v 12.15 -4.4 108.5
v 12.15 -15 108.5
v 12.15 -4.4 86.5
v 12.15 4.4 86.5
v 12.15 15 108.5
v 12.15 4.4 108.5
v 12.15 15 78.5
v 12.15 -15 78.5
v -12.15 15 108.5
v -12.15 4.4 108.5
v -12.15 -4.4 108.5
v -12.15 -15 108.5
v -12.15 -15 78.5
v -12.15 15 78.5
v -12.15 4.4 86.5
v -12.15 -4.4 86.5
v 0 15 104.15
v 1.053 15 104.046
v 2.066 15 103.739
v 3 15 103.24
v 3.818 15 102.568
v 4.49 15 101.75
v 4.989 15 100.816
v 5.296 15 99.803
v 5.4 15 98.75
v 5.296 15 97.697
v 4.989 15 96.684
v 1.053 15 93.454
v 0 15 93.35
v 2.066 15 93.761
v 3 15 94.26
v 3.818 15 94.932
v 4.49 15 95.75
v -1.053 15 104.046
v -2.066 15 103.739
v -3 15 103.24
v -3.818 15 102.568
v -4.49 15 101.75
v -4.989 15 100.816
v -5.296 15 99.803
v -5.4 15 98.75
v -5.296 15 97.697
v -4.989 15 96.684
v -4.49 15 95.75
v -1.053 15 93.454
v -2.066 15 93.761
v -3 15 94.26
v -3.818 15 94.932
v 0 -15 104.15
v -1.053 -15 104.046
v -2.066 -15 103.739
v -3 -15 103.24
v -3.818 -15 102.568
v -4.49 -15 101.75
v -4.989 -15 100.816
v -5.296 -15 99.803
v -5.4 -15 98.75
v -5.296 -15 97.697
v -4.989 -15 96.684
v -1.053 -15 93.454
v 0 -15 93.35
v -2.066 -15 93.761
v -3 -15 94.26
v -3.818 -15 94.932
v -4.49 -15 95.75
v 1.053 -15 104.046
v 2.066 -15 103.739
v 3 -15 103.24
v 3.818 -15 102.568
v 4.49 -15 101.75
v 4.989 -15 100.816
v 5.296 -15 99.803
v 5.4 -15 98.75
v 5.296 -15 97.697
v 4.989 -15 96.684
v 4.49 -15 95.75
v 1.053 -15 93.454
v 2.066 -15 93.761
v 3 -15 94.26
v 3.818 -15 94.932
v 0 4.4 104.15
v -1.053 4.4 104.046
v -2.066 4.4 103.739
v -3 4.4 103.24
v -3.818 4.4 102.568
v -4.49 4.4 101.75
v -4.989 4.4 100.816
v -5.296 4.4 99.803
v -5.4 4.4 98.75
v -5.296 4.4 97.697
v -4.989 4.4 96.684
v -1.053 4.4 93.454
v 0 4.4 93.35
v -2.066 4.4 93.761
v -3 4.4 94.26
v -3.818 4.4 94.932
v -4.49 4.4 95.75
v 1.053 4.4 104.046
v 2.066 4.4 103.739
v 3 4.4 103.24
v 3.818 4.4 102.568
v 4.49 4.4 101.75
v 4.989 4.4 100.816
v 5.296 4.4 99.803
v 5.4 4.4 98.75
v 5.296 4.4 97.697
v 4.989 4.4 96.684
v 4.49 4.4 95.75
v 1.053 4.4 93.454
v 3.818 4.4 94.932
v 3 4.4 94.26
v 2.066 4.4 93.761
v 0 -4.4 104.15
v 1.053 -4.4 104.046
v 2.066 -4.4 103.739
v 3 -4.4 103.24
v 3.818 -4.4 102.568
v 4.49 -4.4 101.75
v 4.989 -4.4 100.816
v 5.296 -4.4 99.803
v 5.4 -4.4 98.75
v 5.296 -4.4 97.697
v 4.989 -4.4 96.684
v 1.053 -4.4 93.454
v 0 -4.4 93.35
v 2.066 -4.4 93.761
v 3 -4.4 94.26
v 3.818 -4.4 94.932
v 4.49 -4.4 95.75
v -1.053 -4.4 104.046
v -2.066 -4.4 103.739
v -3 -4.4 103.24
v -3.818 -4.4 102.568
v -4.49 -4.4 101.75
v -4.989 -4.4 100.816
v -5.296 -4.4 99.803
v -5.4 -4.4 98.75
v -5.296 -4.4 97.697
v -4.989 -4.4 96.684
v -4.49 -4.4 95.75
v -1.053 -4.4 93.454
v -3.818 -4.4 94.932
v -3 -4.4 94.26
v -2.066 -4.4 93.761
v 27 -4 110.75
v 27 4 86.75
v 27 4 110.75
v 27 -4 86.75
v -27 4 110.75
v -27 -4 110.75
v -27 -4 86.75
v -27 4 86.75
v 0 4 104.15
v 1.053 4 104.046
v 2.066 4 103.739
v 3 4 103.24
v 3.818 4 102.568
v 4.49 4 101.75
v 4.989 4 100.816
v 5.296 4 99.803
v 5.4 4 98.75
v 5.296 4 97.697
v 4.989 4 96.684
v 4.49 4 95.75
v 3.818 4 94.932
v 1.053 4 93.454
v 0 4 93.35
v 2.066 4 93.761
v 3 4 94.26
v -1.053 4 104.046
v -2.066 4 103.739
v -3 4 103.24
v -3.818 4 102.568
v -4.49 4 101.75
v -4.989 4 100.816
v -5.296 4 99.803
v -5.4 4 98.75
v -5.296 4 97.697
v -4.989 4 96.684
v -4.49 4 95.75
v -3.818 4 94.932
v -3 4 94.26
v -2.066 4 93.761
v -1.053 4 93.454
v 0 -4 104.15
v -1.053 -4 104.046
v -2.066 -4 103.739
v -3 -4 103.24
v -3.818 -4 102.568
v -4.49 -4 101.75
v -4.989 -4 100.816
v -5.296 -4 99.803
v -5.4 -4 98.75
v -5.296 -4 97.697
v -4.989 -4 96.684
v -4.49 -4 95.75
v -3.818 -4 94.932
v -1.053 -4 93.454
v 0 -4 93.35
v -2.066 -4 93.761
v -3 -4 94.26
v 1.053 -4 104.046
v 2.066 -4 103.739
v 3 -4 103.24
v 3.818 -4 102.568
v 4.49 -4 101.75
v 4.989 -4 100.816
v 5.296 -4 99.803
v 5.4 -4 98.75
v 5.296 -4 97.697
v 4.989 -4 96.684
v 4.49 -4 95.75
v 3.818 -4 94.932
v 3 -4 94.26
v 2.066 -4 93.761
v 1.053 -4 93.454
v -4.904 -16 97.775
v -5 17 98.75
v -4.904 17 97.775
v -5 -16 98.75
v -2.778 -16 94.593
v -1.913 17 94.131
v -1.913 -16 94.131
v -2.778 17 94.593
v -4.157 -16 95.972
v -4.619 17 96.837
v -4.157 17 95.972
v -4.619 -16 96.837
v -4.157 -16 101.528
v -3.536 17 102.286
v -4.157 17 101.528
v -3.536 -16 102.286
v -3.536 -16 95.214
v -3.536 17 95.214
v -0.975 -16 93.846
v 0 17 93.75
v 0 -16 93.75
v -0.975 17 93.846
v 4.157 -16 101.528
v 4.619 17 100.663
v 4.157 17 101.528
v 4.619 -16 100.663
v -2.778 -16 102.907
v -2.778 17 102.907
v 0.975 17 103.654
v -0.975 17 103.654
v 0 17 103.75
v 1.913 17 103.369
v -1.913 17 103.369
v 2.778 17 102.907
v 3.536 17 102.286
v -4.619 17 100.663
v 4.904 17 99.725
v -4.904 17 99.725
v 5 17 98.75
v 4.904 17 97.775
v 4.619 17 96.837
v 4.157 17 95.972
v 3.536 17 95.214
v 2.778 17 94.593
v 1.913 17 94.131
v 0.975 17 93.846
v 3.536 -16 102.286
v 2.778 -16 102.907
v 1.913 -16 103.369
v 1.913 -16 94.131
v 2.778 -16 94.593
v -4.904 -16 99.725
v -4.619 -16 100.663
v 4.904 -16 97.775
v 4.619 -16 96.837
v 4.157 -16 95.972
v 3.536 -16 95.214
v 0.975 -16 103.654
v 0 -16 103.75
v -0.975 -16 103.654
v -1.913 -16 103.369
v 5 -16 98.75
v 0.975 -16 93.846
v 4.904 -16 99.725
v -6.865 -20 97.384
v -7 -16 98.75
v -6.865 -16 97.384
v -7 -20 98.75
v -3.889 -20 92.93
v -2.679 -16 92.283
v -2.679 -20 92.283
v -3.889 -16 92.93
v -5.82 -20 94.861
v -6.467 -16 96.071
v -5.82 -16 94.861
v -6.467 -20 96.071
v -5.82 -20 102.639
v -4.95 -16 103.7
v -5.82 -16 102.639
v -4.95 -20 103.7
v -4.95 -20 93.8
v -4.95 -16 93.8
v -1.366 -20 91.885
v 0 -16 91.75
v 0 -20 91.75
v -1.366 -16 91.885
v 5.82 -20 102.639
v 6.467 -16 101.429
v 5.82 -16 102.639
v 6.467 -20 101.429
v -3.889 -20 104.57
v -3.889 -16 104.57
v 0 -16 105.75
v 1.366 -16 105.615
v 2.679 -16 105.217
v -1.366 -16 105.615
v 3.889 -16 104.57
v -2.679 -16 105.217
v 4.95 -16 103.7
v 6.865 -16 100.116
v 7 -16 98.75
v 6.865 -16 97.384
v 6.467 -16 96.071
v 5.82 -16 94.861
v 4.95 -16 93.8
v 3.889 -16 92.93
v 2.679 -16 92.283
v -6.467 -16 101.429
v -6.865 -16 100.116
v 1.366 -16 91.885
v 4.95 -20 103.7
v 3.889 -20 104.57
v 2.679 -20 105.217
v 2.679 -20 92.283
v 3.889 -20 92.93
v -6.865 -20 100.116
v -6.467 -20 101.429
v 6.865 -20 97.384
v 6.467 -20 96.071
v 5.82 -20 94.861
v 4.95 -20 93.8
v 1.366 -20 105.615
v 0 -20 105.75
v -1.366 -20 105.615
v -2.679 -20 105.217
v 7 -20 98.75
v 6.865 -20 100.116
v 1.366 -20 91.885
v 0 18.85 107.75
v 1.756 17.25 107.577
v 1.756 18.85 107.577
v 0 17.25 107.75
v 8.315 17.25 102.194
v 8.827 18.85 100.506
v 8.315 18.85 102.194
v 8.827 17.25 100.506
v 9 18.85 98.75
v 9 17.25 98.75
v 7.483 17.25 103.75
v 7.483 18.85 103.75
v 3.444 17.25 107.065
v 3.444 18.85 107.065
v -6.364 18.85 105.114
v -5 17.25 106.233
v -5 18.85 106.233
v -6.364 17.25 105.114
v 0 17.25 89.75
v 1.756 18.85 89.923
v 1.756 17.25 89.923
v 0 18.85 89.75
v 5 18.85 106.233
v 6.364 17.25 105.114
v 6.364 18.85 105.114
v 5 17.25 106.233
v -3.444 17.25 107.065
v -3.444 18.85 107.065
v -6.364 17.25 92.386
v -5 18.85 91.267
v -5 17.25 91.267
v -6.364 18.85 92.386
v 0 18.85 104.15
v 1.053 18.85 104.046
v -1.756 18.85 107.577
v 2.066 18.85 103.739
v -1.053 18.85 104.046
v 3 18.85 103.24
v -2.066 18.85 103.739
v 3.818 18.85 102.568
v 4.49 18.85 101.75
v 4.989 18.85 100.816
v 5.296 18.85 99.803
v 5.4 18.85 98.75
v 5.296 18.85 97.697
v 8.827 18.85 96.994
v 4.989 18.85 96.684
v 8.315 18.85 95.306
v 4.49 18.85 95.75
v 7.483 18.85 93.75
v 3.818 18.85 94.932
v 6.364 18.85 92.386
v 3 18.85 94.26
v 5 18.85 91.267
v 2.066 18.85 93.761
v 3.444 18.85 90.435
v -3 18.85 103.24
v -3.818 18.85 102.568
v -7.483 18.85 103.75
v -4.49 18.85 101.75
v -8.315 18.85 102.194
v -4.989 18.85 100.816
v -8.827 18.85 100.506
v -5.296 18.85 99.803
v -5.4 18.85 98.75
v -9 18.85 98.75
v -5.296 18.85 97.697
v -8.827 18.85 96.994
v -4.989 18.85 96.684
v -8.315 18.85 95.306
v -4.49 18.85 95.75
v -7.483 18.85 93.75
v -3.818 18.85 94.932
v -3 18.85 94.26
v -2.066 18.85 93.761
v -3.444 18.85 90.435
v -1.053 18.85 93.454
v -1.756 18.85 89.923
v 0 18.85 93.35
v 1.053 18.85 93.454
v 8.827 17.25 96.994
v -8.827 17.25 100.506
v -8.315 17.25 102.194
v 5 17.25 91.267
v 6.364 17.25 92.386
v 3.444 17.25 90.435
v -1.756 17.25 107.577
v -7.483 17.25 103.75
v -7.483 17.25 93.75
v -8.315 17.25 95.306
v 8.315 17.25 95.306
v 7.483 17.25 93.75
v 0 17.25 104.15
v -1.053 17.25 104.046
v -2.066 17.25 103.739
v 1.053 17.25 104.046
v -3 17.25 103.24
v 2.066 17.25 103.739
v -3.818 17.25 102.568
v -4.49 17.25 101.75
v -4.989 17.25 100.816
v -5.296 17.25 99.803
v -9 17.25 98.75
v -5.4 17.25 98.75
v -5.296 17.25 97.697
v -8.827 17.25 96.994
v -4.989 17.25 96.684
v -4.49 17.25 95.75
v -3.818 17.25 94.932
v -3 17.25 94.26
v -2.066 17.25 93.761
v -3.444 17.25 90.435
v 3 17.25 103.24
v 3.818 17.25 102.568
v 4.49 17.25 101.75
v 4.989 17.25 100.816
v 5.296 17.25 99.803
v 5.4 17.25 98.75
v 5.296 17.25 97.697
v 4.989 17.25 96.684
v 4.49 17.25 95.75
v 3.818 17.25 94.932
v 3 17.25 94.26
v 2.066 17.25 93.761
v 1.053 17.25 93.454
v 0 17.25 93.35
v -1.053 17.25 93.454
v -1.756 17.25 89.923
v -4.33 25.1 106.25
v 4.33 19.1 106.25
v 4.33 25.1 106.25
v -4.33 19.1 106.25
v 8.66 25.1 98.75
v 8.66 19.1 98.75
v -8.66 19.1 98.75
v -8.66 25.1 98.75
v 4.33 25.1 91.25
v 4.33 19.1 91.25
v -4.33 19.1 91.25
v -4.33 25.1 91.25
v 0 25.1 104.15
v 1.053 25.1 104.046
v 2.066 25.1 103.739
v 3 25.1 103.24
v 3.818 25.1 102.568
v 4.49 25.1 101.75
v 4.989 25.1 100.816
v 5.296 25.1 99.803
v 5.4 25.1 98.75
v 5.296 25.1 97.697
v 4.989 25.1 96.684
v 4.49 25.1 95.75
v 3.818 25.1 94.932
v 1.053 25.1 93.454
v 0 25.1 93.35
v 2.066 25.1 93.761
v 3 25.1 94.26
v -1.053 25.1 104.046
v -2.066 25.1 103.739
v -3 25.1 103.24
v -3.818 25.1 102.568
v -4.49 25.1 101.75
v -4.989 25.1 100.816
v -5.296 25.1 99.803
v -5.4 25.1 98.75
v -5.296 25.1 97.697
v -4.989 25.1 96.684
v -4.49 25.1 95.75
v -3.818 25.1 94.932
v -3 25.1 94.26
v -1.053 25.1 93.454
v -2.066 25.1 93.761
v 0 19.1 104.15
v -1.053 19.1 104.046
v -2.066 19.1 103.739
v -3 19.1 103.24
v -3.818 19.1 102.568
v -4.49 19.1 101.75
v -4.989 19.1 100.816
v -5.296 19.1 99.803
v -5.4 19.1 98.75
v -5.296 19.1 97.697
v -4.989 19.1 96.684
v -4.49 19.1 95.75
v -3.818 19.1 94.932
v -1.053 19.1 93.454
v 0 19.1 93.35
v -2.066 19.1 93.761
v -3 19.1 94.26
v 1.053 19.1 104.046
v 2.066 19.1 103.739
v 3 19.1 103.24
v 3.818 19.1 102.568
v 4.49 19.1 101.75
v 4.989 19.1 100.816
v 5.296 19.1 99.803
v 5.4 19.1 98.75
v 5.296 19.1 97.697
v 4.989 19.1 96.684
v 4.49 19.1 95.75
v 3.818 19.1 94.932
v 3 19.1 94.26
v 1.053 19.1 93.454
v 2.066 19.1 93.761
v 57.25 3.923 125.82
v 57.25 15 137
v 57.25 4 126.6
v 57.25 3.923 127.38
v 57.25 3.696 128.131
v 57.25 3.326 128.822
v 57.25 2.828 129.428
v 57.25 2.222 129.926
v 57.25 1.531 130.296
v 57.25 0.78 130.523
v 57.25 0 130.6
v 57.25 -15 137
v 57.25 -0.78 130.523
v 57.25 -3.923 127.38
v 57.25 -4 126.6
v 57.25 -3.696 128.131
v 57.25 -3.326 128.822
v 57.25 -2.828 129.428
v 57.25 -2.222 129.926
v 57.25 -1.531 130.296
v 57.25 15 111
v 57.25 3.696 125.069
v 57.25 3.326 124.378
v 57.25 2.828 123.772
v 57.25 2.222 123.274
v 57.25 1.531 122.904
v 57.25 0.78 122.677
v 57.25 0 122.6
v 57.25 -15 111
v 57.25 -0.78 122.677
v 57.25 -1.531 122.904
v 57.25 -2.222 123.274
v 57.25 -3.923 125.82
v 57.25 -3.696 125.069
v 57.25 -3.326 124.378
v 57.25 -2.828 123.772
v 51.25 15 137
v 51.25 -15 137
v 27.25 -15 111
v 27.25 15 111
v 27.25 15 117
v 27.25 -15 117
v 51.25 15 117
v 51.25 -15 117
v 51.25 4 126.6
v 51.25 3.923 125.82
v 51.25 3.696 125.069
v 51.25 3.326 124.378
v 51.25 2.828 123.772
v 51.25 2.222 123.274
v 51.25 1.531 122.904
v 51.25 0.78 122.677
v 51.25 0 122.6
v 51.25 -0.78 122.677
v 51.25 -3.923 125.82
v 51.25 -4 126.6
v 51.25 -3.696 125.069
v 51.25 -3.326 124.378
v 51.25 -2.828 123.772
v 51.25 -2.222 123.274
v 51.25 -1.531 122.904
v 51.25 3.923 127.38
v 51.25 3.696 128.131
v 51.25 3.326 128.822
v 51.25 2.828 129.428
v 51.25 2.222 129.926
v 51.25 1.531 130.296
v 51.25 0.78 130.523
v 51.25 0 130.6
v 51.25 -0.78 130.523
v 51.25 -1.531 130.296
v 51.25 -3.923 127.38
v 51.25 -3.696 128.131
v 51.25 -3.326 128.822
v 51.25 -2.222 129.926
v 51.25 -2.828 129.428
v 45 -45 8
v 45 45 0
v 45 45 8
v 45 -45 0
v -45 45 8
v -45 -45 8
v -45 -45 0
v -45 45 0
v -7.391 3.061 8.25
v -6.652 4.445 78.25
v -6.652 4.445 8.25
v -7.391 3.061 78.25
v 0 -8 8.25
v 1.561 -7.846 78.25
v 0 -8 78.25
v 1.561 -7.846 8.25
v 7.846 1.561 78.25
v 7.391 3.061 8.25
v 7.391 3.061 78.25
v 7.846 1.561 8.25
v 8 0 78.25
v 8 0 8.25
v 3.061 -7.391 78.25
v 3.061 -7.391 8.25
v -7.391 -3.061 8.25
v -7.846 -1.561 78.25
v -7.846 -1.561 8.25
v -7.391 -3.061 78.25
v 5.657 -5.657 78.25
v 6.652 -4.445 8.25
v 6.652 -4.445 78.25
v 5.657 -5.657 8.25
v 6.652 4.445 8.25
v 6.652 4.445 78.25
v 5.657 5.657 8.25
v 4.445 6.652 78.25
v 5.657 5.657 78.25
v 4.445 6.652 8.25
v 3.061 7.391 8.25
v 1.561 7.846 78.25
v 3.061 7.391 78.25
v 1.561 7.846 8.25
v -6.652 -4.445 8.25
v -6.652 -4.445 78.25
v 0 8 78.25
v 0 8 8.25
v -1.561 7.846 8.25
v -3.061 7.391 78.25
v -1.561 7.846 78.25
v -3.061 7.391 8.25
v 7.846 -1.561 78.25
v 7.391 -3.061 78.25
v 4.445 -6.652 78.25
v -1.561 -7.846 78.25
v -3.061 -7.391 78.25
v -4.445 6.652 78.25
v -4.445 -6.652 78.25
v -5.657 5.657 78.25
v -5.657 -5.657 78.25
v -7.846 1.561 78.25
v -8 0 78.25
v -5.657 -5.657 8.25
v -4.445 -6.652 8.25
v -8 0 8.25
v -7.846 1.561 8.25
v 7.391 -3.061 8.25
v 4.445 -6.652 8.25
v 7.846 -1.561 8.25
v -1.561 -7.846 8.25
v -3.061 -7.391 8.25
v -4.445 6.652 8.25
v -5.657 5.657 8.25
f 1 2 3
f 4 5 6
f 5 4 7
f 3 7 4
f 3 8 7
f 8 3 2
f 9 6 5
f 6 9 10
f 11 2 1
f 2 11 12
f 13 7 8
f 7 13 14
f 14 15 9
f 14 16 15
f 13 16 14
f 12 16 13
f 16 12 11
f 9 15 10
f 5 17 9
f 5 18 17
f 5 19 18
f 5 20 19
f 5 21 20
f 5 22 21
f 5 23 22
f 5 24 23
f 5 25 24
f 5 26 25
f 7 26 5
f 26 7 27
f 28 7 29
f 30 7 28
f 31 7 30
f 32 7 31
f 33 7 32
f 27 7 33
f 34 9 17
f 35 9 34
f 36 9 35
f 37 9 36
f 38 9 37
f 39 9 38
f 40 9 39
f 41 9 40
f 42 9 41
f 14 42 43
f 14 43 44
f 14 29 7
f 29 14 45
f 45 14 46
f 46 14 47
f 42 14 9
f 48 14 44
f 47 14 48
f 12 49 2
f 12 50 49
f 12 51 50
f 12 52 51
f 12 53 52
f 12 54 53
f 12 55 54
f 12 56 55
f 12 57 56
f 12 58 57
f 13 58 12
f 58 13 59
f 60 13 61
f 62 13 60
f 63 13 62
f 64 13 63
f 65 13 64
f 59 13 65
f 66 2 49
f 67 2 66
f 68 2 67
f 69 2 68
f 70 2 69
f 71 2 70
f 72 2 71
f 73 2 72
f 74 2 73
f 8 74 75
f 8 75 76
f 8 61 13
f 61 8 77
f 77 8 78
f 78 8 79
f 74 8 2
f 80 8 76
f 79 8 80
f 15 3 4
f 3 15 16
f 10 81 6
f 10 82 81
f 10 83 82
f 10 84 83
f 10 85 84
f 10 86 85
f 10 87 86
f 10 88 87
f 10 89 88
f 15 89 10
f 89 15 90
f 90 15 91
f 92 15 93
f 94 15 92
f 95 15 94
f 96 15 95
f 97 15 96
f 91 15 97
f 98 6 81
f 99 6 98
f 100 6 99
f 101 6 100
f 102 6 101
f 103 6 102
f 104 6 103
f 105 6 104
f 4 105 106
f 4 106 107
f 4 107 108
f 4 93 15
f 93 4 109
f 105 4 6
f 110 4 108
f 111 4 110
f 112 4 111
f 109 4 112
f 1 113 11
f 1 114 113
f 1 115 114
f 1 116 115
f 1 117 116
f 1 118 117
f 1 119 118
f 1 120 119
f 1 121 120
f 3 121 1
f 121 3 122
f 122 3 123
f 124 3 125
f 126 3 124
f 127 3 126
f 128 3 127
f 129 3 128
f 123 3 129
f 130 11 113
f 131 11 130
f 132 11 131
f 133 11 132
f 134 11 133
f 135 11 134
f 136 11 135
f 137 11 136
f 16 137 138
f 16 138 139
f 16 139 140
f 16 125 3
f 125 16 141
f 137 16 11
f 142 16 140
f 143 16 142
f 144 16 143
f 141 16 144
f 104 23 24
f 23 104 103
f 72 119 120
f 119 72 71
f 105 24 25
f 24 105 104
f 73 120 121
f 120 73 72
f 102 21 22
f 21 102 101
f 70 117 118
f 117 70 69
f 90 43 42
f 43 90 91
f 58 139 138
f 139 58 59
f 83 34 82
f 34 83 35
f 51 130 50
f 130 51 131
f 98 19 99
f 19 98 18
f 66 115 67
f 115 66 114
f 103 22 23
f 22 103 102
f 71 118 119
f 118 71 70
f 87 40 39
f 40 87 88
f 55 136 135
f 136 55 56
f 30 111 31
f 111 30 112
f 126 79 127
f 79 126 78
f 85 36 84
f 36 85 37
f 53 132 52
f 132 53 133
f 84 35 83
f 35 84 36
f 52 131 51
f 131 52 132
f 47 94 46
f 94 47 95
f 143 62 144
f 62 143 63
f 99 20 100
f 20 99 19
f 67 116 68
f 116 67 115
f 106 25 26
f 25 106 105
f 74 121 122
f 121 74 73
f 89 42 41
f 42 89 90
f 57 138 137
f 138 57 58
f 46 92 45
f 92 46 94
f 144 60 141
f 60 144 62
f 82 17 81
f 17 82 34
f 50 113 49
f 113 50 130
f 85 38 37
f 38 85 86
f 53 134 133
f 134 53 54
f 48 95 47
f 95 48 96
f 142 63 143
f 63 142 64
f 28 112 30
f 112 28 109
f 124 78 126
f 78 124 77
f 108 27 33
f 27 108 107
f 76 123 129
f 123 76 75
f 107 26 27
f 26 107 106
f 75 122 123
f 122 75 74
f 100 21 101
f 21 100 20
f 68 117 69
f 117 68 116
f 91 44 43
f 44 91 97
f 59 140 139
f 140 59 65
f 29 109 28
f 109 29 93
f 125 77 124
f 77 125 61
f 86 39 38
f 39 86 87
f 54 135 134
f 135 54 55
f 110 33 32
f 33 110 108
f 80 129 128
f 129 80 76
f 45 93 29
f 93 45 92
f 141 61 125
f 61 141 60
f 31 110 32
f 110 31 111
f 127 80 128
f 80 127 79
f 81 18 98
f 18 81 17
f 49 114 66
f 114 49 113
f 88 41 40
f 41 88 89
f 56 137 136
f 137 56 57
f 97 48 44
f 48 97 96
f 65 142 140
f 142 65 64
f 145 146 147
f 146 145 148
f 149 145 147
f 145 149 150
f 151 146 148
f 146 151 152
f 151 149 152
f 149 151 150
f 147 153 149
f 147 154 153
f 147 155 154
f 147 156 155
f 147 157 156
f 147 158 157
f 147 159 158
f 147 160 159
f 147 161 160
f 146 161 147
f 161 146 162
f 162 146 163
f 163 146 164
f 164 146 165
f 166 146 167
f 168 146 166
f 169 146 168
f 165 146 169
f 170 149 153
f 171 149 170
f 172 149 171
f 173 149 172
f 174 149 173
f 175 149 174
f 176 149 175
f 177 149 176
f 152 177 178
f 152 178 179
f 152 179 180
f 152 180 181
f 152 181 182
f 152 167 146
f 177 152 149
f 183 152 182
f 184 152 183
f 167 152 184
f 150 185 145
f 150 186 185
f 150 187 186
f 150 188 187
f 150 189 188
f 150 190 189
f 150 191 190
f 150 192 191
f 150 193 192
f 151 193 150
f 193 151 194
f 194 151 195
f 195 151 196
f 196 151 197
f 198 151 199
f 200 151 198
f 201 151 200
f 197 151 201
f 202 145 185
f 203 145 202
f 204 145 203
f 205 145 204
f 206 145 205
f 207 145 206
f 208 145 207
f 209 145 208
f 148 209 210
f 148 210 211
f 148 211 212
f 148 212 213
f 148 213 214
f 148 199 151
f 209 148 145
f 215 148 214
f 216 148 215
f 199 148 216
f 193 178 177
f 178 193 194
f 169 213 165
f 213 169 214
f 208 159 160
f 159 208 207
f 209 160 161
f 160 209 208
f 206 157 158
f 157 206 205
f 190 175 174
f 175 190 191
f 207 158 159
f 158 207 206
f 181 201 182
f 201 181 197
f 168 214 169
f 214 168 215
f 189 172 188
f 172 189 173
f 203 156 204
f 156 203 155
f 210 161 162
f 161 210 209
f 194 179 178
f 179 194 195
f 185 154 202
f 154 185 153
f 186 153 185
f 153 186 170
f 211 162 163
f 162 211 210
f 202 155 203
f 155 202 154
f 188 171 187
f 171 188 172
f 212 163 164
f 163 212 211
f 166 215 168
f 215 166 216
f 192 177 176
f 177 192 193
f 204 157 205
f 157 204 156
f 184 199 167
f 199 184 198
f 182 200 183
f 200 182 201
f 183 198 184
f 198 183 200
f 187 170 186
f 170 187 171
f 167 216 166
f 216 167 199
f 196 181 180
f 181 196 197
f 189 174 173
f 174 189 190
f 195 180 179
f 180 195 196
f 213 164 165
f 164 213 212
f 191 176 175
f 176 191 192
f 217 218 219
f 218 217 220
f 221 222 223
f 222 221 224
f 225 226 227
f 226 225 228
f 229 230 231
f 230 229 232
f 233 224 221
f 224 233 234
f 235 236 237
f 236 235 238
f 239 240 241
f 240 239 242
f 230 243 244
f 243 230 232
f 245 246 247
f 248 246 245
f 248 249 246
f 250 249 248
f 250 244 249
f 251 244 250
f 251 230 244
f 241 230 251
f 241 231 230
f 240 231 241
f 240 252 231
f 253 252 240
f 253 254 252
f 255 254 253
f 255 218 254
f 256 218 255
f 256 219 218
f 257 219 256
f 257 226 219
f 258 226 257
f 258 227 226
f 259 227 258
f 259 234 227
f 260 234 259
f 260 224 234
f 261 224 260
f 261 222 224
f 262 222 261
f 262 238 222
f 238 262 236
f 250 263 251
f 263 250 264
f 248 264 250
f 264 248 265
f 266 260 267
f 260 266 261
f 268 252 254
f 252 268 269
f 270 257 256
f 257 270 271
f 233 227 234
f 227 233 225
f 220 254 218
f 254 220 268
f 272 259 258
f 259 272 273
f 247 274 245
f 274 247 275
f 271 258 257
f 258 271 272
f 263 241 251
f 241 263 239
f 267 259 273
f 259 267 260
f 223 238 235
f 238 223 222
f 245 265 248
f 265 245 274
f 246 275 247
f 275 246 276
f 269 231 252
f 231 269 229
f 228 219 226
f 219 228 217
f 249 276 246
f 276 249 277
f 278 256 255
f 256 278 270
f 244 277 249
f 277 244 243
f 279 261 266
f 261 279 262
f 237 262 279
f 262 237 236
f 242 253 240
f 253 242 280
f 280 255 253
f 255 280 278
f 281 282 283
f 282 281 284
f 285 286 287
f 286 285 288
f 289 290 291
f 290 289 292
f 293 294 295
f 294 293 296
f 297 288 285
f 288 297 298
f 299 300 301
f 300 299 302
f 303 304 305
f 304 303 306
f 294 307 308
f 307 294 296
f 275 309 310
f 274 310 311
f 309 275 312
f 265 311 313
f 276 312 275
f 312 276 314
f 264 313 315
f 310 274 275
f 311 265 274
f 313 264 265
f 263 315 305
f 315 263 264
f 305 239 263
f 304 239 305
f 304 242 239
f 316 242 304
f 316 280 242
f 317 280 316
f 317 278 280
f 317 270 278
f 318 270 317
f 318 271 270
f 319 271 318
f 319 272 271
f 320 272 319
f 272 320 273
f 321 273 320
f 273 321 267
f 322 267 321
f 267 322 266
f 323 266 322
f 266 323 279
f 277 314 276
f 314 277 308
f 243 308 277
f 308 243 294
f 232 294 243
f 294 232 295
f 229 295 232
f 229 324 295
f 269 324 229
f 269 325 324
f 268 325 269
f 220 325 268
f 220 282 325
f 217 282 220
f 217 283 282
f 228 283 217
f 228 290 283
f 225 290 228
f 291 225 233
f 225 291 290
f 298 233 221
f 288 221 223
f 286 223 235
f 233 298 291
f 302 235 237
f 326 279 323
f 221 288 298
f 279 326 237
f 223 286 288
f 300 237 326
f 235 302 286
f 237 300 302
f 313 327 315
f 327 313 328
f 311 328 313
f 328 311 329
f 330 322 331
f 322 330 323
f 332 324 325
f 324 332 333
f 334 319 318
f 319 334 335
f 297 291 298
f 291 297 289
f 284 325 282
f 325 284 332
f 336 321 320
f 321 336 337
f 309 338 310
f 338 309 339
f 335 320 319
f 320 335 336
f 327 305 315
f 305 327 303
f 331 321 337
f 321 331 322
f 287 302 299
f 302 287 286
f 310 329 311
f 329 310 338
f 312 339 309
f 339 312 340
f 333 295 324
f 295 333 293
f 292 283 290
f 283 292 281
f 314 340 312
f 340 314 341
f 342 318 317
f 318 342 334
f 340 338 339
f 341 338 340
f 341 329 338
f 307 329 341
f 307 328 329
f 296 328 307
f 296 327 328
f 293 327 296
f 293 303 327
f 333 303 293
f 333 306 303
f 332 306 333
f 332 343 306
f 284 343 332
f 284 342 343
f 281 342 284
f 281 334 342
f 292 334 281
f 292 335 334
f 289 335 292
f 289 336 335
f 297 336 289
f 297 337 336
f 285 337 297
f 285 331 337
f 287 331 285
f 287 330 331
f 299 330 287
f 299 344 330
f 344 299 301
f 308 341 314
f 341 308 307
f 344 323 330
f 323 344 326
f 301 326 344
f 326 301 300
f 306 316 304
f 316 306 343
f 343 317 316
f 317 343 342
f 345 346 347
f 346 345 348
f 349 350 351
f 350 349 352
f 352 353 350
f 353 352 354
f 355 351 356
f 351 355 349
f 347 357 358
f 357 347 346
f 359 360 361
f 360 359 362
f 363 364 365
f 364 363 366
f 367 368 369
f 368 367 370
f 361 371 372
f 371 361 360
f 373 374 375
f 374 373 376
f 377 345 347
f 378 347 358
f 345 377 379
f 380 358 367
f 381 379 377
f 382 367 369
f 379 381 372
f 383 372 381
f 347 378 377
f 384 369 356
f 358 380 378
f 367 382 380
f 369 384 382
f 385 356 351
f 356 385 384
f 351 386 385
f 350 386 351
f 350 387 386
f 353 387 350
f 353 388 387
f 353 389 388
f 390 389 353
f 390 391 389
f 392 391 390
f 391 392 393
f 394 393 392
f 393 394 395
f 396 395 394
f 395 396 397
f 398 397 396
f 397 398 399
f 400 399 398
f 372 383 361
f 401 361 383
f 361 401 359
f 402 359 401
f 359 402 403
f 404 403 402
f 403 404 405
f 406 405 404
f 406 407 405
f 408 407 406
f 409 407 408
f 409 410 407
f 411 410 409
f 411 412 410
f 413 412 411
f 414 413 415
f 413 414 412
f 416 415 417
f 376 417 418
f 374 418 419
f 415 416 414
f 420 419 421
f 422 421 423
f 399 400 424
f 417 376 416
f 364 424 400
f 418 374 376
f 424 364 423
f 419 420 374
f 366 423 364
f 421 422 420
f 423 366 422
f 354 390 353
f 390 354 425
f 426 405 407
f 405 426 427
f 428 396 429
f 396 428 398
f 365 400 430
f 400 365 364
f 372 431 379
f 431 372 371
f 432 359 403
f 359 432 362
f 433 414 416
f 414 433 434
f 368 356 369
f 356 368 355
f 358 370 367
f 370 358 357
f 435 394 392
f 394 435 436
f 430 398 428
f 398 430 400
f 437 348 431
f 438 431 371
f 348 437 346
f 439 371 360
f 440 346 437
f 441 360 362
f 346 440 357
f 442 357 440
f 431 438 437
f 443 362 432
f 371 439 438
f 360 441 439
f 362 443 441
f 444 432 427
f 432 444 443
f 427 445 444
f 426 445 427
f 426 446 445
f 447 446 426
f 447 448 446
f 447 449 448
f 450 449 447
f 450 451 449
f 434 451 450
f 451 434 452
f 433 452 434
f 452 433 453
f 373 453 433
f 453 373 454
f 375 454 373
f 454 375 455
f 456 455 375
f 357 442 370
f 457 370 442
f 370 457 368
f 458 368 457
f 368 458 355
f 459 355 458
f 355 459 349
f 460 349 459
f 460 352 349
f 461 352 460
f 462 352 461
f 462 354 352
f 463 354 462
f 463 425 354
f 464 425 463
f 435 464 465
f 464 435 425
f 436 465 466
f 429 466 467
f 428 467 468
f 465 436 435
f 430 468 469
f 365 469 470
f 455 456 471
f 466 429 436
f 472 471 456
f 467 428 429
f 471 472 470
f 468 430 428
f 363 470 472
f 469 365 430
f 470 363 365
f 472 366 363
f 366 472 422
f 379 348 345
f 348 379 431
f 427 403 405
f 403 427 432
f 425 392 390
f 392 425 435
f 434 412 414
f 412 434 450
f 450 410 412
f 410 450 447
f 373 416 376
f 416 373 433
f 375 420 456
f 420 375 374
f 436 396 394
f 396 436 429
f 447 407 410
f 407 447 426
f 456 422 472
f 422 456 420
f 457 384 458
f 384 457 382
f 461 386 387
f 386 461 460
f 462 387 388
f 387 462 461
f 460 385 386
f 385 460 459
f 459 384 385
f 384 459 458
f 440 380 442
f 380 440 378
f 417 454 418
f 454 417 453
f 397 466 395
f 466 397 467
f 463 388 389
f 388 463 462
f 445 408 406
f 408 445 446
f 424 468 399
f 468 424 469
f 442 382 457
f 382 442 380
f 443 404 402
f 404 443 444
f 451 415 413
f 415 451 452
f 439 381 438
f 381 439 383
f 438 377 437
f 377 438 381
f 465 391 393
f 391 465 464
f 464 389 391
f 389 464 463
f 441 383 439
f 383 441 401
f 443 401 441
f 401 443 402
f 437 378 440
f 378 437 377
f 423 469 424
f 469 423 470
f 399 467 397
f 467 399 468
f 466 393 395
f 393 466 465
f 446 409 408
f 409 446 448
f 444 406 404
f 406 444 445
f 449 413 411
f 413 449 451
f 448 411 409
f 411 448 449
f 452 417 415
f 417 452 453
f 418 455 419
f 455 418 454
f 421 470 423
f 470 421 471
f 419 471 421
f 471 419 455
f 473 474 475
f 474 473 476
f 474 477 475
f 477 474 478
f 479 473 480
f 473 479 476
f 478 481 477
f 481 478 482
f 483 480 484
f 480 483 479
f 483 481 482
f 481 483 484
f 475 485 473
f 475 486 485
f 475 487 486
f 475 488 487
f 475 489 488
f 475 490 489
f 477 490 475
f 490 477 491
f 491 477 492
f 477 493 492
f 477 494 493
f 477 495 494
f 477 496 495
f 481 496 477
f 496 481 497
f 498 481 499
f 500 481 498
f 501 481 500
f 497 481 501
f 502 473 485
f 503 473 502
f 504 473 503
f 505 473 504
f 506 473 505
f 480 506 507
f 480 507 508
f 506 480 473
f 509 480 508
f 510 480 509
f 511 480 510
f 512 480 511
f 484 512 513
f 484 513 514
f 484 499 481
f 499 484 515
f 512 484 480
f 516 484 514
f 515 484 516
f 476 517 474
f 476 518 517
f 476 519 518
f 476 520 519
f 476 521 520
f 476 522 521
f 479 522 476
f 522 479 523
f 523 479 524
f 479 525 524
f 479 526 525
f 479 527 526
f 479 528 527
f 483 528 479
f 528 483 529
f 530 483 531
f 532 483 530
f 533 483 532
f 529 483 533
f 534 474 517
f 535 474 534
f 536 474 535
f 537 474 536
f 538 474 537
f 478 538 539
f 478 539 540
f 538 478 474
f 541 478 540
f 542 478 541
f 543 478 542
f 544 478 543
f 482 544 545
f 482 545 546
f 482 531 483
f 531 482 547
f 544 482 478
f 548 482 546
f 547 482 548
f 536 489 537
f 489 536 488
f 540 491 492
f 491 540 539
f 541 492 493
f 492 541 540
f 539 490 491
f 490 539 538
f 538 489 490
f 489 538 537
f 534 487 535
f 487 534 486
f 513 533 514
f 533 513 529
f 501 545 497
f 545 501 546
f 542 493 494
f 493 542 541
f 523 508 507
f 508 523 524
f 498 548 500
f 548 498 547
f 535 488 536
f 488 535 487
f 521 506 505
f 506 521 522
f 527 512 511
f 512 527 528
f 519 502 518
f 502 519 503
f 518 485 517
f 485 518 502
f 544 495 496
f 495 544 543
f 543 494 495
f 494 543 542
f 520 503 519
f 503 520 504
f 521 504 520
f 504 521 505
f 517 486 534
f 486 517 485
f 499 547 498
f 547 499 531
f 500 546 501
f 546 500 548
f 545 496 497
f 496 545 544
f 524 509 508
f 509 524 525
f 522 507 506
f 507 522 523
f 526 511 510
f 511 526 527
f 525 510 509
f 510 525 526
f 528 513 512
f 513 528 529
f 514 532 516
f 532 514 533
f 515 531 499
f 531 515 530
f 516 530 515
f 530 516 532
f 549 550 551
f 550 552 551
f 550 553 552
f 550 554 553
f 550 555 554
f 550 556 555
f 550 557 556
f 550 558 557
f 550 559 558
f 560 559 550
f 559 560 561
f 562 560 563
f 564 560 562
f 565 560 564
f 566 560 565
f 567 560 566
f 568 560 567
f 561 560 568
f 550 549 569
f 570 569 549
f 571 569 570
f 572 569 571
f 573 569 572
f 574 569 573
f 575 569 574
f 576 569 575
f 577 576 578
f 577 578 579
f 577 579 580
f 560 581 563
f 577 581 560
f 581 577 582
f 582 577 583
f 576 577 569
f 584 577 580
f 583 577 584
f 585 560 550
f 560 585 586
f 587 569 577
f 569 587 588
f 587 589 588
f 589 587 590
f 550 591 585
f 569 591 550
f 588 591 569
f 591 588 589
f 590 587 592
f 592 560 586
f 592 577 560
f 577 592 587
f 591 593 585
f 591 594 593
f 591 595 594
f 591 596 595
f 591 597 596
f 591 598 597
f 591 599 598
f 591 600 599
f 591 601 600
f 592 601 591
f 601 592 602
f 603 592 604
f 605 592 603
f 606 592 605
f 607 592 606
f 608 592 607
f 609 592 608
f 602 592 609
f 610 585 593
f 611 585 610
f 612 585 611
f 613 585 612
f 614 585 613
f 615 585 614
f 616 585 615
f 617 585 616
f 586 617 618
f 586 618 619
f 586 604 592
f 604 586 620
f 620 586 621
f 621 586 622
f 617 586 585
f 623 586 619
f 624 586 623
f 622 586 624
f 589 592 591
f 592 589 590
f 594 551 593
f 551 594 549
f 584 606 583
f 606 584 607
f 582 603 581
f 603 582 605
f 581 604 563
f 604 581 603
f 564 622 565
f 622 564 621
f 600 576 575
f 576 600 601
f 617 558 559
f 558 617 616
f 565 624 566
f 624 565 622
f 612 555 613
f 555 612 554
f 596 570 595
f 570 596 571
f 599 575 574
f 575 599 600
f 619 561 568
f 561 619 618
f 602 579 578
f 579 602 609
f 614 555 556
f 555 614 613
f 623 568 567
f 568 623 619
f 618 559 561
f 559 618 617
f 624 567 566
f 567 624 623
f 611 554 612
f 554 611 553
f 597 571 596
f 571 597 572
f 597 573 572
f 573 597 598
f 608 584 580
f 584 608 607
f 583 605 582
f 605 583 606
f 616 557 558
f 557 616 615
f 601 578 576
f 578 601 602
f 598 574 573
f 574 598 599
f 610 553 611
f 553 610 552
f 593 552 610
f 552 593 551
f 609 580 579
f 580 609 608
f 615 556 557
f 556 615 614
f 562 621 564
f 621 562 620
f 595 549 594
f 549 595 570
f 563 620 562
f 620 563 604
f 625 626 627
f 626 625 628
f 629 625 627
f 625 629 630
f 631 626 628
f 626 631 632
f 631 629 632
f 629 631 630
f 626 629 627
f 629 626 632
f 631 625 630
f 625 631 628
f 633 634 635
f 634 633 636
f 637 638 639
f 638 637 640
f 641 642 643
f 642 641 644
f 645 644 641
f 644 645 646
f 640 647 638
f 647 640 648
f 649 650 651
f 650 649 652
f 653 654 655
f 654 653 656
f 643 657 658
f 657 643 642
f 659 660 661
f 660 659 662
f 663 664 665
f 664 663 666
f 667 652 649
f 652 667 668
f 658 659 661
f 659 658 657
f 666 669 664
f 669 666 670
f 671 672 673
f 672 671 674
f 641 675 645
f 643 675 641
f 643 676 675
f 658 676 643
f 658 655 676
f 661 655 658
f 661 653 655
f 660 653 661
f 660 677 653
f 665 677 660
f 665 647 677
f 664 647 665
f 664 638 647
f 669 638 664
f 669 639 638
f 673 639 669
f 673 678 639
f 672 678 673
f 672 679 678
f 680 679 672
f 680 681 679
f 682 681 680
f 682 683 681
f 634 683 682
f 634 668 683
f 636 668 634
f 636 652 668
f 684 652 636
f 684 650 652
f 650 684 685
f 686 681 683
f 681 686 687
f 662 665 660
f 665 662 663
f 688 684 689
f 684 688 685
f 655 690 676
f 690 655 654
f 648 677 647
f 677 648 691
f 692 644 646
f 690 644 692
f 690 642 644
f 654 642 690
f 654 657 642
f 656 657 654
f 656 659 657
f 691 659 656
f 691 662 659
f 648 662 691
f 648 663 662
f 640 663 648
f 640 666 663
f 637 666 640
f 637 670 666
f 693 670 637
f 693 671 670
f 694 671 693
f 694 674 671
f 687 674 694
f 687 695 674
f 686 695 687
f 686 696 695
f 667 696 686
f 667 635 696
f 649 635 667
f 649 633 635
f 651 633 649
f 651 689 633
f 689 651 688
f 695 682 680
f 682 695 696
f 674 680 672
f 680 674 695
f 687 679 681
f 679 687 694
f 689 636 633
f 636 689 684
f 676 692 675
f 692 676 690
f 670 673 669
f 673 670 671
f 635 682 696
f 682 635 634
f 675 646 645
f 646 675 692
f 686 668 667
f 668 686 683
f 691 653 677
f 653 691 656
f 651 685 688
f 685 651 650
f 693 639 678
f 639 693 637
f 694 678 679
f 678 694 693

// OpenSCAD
$fn = 32;

// ------------------------------------------------------------------------
// Lamp arm: column d16 x 70 mm, arm 54 mm
// Every part is its own module, assembly() places every instance.
// ------------------------------------------------------------------------

// --- part 1 ---
module lamp_base() {
  difference() {
    translate([-45, -45, 0]) cube([90, 90, 8]);
  }
}

// --- part 2 ---
module lamp_column() {
  cylinder(h = 70, d = 16);
}

// --- part 3 ---
module head_fork() {
  difference() {
    translate([-12.15, -15, 0]) cube([24.3, 30, 30]);
    translate([-13.15, -4.4, 8]) cube([26.3, 8.8, 23]);
    translate([0, 0, 20.25]) rotate([90, 0, 0]) cylinder(h = 32, d = 10.8, center = true);
  }
}

// --- part 4 ---
module lamp_arm() {
  difference() {
    translate([-27, -4, 0]) cube([54, 8, 24]);
    translate([0, 0, 12]) rotate([90, 0, 0]) cylinder(h = 10, d = 10.8, center = true);
  }
}

// --- part 5 ---
module arm_pin() {
  rotate([0, 90, 0]) cylinder(h = 34, d = 10, center = true);
  translate([-20, 0, 0]) rotate([0, 90, 0]) cylinder(h = 4, d = 14);
}

// --- part 6 ---
module arm_washer() {
  difference() {
      translate([0, 0, 0]) cylinder(h = 1.6, d = 18);
      translate([0, 0, -1]) cylinder(h = 3.6, d = 10.8);
    }
}

// --- part 7 ---
module arm_nut() {
  difference() {
    linear_extrude(height = 6) polygon(points = [[8.66, 0], [4.33, 7.5], [-4.33, 7.5], [-8.66, 0], [-4.33, -7.5], [4.33, -7.5]]);
    translate([0, 0, -1]) cylinder(h = 8, d = 10.8);
  }
}

// --- part 8 ---
module shade_bracket() {
  difference() {
    translate([-15, -15, 0]) cube([30, 30, 26]);
    translate([-16, -16, 6]) cube([25, 32, 21]);
    translate([12, 0, 15.6]) rotate([0, 90, 0]) cylinder(h = 8, d = 8, center = true);
  }
}

// --- assembly ---
module assembly() {
  color([0.80, 0.24, 0.20]) translate([0, 0, 0]) rotate([0, 0, 0]) lamp_base();
  color([0.20, 0.45, 0.75]) translate([0, 0, 8.25]) rotate([0, 0, 0]) lamp_column();
  color([0.25, 0.62, 0.32]) translate([0, 0, 78.5]) rotate([0, 0, 0]) head_fork();
  color([0.92, 0.70, 0.18]) translate([0, 0, 86.75]) rotate([0, 0, 0]) lamp_arm();
  color([0.58, 0.35, 0.70]) translate([0, 0, 98.75]) rotate([0, 0, 90]) arm_pin();
  color([0.16, 0.66, 0.66]) translate([0, 18.85, 98.75]) rotate([90, 0, 0]) arm_washer();
  color([0.85, 0.48, 0.18]) translate([0, 25.1, 98.75]) rotate([90, 0, 0]) arm_nut();
  color([0.55, 0.60, 0.65]) translate([42.25, 0, 111]) rotate([0, 0, 0]) shade_bracket();
}

assembly();
